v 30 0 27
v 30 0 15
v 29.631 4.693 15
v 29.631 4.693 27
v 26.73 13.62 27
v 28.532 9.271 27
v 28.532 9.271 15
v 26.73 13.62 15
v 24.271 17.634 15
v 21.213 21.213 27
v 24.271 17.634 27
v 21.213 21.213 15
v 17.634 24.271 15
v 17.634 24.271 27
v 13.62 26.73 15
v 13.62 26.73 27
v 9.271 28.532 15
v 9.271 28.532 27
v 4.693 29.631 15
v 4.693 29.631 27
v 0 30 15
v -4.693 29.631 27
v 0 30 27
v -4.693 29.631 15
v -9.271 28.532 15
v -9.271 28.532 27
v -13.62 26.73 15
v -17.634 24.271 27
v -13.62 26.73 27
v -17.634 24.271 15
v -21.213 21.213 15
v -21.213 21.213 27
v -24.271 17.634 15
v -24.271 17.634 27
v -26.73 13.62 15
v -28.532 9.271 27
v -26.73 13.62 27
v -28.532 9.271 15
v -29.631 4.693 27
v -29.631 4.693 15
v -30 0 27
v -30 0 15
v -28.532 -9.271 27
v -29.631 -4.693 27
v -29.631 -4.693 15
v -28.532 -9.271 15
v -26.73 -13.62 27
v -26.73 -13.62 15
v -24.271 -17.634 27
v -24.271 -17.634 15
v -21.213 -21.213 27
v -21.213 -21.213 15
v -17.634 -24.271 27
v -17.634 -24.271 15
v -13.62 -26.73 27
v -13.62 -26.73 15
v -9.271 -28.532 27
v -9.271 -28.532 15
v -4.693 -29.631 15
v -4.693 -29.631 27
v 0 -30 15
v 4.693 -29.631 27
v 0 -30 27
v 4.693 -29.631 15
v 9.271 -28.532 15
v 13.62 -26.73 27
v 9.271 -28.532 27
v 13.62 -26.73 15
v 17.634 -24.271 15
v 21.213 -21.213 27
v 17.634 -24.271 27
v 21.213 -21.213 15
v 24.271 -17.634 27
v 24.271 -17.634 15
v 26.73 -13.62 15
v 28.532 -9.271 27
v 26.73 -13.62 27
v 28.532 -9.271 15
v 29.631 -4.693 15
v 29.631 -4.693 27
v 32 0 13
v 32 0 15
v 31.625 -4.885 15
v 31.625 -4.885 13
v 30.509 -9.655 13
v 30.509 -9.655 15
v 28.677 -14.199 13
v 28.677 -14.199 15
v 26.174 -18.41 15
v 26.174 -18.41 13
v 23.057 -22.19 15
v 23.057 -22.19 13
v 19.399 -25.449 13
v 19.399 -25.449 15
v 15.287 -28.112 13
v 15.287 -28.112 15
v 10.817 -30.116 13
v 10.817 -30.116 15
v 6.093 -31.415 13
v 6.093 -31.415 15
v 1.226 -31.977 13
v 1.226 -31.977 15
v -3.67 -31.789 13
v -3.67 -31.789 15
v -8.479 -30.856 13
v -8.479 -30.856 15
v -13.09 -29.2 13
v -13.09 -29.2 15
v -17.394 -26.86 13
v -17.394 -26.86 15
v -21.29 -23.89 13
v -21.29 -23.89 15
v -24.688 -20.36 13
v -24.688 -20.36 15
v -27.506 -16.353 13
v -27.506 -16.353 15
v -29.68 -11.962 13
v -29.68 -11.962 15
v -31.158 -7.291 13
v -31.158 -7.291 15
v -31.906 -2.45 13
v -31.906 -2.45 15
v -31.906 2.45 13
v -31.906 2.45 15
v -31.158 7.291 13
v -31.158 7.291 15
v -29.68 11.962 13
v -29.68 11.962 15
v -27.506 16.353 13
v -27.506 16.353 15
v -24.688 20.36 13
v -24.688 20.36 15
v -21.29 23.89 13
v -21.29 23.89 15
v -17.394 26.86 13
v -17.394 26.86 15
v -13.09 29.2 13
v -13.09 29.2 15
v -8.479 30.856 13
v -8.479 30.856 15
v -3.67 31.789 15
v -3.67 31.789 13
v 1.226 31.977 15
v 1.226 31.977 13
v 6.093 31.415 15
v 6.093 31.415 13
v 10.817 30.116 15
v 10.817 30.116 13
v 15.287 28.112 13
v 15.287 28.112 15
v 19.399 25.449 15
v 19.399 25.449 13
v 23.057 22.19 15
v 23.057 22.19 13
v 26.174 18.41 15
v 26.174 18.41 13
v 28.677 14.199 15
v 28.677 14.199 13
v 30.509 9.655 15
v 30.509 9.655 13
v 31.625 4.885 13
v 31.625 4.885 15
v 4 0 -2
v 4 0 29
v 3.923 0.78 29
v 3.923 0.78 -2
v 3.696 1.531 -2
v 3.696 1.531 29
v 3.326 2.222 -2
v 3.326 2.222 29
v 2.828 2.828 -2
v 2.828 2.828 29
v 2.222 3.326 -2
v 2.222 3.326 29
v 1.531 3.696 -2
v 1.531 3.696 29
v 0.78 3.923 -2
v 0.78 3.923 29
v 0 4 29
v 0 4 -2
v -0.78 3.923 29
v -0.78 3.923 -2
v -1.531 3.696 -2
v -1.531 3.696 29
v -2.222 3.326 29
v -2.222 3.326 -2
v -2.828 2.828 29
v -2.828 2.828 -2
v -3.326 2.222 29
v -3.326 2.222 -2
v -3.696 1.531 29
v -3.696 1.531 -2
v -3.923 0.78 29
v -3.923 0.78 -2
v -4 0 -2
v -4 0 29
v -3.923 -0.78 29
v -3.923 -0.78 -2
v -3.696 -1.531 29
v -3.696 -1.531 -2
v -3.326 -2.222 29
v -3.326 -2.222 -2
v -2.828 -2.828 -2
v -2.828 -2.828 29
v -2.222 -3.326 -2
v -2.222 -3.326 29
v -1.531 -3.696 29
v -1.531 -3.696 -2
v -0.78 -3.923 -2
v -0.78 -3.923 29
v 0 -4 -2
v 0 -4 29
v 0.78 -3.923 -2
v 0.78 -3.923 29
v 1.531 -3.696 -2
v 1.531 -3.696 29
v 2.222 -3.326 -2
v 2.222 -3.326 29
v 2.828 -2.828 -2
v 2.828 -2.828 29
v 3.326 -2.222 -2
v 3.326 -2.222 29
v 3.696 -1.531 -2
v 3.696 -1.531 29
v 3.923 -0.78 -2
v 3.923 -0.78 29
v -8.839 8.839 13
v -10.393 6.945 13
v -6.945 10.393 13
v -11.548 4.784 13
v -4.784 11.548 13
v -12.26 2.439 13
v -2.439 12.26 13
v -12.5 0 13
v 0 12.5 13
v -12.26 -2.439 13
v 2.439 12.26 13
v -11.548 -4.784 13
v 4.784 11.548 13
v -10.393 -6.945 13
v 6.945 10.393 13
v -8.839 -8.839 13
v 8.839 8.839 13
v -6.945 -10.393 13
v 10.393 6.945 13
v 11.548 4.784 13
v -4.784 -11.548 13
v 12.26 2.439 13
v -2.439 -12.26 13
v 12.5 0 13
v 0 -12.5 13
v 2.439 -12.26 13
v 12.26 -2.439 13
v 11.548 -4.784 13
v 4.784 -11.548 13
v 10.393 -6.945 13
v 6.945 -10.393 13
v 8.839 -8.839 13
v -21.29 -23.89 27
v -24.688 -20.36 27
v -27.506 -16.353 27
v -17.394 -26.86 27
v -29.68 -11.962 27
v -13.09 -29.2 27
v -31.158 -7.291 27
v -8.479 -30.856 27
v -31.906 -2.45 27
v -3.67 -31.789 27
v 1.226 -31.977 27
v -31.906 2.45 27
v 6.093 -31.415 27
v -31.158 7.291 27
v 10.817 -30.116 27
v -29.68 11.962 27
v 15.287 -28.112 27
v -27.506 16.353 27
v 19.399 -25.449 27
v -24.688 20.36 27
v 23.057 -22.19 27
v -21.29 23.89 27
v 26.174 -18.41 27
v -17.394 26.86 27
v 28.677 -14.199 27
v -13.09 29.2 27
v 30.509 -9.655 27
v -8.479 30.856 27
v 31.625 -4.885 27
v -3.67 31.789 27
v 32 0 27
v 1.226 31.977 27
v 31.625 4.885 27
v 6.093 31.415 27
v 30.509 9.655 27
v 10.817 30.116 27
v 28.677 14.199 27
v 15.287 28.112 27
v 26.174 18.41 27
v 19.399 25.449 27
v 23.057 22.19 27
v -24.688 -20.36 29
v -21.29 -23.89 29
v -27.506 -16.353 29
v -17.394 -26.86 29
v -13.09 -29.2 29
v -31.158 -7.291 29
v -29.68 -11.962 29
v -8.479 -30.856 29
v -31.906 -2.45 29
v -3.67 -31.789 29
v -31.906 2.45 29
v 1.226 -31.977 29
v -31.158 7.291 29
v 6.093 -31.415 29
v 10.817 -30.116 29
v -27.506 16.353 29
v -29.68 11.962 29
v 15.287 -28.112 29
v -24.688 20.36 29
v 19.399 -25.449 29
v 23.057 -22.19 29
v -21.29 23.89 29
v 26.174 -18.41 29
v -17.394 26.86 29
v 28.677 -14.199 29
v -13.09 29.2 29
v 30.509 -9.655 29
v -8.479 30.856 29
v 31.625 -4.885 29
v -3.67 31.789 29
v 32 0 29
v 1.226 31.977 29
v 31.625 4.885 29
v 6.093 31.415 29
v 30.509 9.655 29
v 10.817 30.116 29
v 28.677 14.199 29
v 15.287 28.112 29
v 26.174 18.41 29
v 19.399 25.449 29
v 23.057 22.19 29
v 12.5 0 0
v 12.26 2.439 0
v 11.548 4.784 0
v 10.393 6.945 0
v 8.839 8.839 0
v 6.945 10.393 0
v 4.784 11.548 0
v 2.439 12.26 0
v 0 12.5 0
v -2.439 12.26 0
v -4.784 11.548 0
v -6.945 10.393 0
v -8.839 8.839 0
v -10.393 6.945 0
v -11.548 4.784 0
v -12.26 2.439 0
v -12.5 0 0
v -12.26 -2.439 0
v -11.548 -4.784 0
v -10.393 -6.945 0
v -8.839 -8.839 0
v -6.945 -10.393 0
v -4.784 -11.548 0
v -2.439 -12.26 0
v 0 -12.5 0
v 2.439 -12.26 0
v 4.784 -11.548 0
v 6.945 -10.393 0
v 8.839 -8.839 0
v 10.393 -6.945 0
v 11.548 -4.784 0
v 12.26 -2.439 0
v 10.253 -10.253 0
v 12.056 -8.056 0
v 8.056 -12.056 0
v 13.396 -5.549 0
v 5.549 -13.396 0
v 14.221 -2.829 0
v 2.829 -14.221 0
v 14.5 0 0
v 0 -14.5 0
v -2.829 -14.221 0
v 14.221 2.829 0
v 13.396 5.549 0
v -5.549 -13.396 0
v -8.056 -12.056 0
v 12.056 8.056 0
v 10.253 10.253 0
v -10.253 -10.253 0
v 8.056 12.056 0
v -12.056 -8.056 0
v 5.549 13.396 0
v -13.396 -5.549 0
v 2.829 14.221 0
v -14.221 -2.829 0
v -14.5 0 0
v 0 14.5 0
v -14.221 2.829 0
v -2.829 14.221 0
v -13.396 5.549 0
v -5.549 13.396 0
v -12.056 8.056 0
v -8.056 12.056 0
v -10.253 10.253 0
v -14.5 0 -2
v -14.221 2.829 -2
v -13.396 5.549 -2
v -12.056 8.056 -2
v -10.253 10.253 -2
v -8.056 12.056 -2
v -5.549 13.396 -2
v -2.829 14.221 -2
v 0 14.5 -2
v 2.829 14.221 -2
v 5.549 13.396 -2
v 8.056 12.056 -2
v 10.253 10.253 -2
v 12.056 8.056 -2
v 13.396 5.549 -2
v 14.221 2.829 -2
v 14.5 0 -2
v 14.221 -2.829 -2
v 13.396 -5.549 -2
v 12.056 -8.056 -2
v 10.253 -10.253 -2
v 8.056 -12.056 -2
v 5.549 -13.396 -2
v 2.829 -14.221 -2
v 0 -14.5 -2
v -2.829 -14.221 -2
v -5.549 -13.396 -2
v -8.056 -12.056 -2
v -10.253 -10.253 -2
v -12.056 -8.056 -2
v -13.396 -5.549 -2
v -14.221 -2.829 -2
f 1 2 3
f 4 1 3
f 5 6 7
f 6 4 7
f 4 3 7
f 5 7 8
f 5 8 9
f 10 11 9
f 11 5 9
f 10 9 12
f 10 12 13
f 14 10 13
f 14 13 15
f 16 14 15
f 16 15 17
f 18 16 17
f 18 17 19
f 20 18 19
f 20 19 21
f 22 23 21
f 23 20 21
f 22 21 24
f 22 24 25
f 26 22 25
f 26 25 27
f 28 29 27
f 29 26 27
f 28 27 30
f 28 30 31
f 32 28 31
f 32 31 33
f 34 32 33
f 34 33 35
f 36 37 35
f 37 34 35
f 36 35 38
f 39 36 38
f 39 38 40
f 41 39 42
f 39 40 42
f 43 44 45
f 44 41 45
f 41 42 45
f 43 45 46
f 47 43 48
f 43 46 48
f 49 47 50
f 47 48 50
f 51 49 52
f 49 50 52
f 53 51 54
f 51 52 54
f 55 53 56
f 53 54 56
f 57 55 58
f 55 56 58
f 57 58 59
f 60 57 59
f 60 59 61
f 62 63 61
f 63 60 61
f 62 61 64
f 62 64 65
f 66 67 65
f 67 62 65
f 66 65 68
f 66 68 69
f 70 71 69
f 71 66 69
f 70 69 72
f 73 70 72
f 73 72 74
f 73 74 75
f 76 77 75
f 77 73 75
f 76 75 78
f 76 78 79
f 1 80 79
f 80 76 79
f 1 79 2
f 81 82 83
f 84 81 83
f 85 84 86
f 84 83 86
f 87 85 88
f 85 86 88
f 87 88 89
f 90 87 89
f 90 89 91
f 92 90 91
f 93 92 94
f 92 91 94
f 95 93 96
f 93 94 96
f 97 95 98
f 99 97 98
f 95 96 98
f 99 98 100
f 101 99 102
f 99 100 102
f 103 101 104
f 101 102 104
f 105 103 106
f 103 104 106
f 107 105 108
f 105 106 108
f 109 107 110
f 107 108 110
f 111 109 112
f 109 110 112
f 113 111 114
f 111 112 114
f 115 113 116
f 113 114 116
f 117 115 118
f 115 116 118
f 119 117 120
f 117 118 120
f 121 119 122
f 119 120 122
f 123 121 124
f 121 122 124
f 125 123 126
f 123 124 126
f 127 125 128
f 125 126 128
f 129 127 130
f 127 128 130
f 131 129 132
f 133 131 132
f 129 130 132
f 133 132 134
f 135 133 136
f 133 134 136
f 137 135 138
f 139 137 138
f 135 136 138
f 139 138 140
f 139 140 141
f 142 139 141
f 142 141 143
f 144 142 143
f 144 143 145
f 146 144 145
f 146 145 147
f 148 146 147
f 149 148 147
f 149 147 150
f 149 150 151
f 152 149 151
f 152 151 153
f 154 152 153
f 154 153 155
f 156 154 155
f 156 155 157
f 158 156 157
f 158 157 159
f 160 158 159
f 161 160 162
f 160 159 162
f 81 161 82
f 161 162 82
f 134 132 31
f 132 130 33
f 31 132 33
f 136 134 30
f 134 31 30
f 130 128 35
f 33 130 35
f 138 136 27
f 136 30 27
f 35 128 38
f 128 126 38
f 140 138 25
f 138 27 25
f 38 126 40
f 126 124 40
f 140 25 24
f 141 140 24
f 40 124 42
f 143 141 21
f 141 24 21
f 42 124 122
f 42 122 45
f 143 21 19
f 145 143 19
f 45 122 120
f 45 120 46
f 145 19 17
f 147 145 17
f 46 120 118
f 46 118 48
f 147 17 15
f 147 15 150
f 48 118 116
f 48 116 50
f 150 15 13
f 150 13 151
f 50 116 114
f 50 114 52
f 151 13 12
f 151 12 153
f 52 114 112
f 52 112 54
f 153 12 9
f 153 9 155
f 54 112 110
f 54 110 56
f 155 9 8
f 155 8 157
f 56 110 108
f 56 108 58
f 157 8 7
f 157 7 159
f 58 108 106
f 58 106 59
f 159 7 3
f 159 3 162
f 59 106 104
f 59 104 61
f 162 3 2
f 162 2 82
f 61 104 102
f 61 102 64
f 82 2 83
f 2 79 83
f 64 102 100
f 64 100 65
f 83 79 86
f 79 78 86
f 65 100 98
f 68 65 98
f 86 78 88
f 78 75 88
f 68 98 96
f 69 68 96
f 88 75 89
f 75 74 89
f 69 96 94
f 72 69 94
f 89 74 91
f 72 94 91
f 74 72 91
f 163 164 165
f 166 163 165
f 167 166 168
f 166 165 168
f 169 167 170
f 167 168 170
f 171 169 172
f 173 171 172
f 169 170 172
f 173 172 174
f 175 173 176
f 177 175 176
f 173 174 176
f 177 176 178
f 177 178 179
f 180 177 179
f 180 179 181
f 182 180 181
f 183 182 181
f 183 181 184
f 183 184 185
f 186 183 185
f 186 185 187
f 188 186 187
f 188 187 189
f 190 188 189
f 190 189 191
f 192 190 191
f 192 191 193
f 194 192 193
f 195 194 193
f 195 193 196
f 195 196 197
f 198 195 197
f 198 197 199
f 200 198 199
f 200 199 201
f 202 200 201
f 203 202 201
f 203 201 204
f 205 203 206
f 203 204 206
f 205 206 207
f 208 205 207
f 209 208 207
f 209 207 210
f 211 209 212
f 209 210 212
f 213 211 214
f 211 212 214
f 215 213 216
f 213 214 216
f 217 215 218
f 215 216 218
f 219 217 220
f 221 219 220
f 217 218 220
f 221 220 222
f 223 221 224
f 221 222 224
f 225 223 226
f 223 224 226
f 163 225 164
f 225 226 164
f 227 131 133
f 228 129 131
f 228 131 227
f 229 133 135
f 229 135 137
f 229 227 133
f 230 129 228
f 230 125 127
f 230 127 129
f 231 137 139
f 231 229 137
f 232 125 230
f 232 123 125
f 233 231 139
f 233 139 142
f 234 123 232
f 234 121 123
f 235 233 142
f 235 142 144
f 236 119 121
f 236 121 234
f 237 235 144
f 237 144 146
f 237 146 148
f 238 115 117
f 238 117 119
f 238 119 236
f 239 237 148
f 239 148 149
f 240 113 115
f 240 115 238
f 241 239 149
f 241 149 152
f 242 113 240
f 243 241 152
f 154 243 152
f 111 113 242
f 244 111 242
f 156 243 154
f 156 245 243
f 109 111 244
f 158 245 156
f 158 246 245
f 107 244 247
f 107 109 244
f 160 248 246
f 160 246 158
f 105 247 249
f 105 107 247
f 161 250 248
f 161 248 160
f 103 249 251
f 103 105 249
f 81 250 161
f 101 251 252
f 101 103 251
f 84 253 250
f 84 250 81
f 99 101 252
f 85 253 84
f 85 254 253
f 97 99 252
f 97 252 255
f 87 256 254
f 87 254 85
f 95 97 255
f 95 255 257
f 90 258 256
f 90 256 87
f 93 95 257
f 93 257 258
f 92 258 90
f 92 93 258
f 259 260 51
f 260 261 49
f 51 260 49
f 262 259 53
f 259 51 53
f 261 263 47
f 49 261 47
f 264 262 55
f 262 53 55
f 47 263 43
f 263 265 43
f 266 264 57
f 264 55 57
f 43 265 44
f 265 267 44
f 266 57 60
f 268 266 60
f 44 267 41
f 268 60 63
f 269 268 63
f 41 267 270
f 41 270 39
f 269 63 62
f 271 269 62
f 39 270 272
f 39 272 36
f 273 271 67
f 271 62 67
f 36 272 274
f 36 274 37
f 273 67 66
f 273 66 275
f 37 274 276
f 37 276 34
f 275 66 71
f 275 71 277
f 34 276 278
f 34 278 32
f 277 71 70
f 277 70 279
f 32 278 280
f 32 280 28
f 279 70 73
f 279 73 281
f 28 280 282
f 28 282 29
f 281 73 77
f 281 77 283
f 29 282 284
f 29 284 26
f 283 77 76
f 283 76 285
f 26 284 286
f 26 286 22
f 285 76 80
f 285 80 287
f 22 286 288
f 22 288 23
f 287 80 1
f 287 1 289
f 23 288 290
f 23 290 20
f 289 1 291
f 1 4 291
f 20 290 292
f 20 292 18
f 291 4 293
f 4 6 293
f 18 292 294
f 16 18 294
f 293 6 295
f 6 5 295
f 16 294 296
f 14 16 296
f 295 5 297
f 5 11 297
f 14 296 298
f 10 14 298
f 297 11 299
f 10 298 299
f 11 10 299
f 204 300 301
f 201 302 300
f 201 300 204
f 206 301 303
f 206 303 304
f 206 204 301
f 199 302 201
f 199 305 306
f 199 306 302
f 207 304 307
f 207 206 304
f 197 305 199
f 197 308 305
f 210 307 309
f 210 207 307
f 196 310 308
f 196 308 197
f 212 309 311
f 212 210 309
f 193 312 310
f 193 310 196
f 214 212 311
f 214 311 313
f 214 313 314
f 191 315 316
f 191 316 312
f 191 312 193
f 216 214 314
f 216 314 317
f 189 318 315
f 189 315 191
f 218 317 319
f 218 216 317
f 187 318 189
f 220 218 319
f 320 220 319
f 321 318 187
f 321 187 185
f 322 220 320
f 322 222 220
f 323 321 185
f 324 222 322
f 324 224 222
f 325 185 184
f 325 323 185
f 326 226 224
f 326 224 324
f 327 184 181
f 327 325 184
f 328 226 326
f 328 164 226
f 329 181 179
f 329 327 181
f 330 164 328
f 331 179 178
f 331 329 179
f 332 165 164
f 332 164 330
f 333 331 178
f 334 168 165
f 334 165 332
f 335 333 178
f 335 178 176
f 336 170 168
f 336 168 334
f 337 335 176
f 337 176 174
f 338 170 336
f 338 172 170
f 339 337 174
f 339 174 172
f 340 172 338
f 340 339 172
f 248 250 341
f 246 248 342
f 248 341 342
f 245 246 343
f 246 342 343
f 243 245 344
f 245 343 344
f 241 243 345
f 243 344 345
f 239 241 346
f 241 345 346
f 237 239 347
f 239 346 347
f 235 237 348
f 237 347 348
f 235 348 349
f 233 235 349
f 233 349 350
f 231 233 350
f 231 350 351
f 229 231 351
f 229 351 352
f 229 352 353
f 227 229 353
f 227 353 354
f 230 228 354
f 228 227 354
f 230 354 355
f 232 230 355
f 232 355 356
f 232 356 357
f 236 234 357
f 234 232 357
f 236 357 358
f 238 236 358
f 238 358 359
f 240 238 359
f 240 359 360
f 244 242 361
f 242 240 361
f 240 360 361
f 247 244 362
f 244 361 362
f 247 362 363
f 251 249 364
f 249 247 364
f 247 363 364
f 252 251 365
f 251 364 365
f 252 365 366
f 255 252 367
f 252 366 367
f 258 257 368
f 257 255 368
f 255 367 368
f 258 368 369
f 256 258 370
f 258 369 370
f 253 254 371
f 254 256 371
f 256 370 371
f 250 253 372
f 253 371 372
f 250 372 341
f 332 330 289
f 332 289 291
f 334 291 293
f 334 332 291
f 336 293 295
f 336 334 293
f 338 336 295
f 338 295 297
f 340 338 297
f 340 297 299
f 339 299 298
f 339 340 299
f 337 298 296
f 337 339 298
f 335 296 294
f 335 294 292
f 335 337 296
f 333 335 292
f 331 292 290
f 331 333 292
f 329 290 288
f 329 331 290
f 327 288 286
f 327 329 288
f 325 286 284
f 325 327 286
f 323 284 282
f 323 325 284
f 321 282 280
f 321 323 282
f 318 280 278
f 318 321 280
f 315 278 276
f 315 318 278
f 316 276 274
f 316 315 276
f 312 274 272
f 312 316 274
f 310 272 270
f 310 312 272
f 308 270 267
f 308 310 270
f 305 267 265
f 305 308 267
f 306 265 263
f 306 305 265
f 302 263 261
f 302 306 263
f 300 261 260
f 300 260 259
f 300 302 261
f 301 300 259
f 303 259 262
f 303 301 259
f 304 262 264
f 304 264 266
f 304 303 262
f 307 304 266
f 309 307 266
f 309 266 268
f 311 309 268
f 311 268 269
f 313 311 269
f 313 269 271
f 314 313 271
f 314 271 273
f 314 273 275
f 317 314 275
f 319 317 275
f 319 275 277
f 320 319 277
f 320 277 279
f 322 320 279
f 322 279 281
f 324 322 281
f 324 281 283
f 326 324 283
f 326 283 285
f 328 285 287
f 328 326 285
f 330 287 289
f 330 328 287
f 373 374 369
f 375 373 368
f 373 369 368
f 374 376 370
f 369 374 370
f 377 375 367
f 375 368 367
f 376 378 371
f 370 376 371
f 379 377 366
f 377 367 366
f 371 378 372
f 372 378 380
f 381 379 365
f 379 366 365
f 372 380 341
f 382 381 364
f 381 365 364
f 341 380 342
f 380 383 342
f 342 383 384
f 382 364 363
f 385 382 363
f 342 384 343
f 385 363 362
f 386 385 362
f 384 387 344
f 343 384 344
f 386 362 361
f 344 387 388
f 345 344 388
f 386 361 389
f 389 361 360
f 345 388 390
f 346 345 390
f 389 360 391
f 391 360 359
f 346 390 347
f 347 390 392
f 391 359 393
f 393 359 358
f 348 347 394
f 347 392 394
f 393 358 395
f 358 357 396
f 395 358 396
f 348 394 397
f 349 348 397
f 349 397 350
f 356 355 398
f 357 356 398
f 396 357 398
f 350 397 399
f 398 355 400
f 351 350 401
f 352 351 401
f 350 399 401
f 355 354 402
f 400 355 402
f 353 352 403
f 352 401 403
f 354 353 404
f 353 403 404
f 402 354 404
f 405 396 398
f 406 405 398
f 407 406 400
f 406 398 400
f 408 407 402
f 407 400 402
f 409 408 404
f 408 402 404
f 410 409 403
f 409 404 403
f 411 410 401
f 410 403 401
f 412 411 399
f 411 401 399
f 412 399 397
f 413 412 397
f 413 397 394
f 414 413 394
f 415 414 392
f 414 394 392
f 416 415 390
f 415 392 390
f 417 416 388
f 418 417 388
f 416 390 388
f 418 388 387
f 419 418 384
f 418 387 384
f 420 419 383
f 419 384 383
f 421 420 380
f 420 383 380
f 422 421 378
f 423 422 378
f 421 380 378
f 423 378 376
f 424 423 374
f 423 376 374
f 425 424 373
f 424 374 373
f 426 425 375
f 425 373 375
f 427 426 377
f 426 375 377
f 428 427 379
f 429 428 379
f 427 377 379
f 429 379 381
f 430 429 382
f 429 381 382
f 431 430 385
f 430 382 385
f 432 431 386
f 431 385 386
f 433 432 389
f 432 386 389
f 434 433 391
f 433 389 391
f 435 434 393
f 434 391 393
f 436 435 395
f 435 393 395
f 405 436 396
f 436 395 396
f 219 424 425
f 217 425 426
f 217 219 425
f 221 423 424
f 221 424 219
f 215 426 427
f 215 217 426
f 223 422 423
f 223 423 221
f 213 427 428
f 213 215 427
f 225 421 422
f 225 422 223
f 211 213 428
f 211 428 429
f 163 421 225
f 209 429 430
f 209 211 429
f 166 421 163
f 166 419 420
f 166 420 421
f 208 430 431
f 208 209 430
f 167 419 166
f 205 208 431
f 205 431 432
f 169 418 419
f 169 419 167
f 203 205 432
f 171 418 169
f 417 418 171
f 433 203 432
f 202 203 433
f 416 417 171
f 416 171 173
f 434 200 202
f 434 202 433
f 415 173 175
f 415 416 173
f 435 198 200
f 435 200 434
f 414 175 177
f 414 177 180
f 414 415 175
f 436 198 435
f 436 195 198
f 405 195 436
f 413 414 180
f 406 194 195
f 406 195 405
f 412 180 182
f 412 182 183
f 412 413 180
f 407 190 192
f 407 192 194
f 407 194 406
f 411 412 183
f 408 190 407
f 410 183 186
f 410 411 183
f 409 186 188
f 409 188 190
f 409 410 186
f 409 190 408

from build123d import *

# Parameters (mm, degrees)
SKETCH_1_R          = 12.5
EXTRUDE_1_DEPTH     = 15
SKETCH_2_R          = 30
EXTRUDE_2_DEPTH     = 14
SKETCH_3_R          = 32
EXTRUDE_3_DEPTH     = 2
SKETCH_4_R          = 32
EXTRUDE_4_DEPTH     = 2
SKETCH_5_R          = 14.5
EXTRUDE_5_DEPTH     = 2
SKETCH_6_R          = 4
CUT_EXTRUDE_1_DEPTH = 55.854352608


with BuildPart() as part:
    # 草图1 → 拉伸1 (new body)
    with BuildSketch(Plane.XY):
        Circle(SKETCH_1_R)
    extrude(amount=EXTRUDE_1_DEPTH)

    # 草图2 → 拉伸2 (add)
    with BuildSketch(Plane.XY.offset(15)):
        Circle(SKETCH_2_R)
    extrude(amount=EXTRUDE_2_DEPTH)

    # 草图3 → 拉伸3 (add)
    with BuildSketch(Plane.XY.offset(29)):
        Circle(SKETCH_3_R)
    extrude(amount=-EXTRUDE_3_DEPTH)

    # 草图4 → 拉伸4 (add)
    with BuildSketch(Plane(origin=(0, 0, 15), x_dir=(-1, 0, 0), z_dir=(0, 0, -1))):
        with Locations(Location((0, 0, 0), (0, 0, 180))):
            Circle(SKETCH_4_R)
    extrude(amount=EXTRUDE_4_DEPTH)

    # 草图5 → 拉伸5 (add)
    with BuildSketch(Plane(origin=(0, 0, 0), x_dir=(-1, 0, 0), z_dir=(0, 0, -1))):
        Circle(SKETCH_5_R)
    extrude(amount=EXTRUDE_5_DEPTH)

    # 草图6 → 切除-拉伸1 (cut, through all)
    with BuildSketch(Plane.XY.offset(29)):
        Circle(SKETCH_6_R)
    extrude(amount=-CUT_EXTRUDE_1_DEPTH, mode=Mode.SUBTRACT)


solid = part.part
